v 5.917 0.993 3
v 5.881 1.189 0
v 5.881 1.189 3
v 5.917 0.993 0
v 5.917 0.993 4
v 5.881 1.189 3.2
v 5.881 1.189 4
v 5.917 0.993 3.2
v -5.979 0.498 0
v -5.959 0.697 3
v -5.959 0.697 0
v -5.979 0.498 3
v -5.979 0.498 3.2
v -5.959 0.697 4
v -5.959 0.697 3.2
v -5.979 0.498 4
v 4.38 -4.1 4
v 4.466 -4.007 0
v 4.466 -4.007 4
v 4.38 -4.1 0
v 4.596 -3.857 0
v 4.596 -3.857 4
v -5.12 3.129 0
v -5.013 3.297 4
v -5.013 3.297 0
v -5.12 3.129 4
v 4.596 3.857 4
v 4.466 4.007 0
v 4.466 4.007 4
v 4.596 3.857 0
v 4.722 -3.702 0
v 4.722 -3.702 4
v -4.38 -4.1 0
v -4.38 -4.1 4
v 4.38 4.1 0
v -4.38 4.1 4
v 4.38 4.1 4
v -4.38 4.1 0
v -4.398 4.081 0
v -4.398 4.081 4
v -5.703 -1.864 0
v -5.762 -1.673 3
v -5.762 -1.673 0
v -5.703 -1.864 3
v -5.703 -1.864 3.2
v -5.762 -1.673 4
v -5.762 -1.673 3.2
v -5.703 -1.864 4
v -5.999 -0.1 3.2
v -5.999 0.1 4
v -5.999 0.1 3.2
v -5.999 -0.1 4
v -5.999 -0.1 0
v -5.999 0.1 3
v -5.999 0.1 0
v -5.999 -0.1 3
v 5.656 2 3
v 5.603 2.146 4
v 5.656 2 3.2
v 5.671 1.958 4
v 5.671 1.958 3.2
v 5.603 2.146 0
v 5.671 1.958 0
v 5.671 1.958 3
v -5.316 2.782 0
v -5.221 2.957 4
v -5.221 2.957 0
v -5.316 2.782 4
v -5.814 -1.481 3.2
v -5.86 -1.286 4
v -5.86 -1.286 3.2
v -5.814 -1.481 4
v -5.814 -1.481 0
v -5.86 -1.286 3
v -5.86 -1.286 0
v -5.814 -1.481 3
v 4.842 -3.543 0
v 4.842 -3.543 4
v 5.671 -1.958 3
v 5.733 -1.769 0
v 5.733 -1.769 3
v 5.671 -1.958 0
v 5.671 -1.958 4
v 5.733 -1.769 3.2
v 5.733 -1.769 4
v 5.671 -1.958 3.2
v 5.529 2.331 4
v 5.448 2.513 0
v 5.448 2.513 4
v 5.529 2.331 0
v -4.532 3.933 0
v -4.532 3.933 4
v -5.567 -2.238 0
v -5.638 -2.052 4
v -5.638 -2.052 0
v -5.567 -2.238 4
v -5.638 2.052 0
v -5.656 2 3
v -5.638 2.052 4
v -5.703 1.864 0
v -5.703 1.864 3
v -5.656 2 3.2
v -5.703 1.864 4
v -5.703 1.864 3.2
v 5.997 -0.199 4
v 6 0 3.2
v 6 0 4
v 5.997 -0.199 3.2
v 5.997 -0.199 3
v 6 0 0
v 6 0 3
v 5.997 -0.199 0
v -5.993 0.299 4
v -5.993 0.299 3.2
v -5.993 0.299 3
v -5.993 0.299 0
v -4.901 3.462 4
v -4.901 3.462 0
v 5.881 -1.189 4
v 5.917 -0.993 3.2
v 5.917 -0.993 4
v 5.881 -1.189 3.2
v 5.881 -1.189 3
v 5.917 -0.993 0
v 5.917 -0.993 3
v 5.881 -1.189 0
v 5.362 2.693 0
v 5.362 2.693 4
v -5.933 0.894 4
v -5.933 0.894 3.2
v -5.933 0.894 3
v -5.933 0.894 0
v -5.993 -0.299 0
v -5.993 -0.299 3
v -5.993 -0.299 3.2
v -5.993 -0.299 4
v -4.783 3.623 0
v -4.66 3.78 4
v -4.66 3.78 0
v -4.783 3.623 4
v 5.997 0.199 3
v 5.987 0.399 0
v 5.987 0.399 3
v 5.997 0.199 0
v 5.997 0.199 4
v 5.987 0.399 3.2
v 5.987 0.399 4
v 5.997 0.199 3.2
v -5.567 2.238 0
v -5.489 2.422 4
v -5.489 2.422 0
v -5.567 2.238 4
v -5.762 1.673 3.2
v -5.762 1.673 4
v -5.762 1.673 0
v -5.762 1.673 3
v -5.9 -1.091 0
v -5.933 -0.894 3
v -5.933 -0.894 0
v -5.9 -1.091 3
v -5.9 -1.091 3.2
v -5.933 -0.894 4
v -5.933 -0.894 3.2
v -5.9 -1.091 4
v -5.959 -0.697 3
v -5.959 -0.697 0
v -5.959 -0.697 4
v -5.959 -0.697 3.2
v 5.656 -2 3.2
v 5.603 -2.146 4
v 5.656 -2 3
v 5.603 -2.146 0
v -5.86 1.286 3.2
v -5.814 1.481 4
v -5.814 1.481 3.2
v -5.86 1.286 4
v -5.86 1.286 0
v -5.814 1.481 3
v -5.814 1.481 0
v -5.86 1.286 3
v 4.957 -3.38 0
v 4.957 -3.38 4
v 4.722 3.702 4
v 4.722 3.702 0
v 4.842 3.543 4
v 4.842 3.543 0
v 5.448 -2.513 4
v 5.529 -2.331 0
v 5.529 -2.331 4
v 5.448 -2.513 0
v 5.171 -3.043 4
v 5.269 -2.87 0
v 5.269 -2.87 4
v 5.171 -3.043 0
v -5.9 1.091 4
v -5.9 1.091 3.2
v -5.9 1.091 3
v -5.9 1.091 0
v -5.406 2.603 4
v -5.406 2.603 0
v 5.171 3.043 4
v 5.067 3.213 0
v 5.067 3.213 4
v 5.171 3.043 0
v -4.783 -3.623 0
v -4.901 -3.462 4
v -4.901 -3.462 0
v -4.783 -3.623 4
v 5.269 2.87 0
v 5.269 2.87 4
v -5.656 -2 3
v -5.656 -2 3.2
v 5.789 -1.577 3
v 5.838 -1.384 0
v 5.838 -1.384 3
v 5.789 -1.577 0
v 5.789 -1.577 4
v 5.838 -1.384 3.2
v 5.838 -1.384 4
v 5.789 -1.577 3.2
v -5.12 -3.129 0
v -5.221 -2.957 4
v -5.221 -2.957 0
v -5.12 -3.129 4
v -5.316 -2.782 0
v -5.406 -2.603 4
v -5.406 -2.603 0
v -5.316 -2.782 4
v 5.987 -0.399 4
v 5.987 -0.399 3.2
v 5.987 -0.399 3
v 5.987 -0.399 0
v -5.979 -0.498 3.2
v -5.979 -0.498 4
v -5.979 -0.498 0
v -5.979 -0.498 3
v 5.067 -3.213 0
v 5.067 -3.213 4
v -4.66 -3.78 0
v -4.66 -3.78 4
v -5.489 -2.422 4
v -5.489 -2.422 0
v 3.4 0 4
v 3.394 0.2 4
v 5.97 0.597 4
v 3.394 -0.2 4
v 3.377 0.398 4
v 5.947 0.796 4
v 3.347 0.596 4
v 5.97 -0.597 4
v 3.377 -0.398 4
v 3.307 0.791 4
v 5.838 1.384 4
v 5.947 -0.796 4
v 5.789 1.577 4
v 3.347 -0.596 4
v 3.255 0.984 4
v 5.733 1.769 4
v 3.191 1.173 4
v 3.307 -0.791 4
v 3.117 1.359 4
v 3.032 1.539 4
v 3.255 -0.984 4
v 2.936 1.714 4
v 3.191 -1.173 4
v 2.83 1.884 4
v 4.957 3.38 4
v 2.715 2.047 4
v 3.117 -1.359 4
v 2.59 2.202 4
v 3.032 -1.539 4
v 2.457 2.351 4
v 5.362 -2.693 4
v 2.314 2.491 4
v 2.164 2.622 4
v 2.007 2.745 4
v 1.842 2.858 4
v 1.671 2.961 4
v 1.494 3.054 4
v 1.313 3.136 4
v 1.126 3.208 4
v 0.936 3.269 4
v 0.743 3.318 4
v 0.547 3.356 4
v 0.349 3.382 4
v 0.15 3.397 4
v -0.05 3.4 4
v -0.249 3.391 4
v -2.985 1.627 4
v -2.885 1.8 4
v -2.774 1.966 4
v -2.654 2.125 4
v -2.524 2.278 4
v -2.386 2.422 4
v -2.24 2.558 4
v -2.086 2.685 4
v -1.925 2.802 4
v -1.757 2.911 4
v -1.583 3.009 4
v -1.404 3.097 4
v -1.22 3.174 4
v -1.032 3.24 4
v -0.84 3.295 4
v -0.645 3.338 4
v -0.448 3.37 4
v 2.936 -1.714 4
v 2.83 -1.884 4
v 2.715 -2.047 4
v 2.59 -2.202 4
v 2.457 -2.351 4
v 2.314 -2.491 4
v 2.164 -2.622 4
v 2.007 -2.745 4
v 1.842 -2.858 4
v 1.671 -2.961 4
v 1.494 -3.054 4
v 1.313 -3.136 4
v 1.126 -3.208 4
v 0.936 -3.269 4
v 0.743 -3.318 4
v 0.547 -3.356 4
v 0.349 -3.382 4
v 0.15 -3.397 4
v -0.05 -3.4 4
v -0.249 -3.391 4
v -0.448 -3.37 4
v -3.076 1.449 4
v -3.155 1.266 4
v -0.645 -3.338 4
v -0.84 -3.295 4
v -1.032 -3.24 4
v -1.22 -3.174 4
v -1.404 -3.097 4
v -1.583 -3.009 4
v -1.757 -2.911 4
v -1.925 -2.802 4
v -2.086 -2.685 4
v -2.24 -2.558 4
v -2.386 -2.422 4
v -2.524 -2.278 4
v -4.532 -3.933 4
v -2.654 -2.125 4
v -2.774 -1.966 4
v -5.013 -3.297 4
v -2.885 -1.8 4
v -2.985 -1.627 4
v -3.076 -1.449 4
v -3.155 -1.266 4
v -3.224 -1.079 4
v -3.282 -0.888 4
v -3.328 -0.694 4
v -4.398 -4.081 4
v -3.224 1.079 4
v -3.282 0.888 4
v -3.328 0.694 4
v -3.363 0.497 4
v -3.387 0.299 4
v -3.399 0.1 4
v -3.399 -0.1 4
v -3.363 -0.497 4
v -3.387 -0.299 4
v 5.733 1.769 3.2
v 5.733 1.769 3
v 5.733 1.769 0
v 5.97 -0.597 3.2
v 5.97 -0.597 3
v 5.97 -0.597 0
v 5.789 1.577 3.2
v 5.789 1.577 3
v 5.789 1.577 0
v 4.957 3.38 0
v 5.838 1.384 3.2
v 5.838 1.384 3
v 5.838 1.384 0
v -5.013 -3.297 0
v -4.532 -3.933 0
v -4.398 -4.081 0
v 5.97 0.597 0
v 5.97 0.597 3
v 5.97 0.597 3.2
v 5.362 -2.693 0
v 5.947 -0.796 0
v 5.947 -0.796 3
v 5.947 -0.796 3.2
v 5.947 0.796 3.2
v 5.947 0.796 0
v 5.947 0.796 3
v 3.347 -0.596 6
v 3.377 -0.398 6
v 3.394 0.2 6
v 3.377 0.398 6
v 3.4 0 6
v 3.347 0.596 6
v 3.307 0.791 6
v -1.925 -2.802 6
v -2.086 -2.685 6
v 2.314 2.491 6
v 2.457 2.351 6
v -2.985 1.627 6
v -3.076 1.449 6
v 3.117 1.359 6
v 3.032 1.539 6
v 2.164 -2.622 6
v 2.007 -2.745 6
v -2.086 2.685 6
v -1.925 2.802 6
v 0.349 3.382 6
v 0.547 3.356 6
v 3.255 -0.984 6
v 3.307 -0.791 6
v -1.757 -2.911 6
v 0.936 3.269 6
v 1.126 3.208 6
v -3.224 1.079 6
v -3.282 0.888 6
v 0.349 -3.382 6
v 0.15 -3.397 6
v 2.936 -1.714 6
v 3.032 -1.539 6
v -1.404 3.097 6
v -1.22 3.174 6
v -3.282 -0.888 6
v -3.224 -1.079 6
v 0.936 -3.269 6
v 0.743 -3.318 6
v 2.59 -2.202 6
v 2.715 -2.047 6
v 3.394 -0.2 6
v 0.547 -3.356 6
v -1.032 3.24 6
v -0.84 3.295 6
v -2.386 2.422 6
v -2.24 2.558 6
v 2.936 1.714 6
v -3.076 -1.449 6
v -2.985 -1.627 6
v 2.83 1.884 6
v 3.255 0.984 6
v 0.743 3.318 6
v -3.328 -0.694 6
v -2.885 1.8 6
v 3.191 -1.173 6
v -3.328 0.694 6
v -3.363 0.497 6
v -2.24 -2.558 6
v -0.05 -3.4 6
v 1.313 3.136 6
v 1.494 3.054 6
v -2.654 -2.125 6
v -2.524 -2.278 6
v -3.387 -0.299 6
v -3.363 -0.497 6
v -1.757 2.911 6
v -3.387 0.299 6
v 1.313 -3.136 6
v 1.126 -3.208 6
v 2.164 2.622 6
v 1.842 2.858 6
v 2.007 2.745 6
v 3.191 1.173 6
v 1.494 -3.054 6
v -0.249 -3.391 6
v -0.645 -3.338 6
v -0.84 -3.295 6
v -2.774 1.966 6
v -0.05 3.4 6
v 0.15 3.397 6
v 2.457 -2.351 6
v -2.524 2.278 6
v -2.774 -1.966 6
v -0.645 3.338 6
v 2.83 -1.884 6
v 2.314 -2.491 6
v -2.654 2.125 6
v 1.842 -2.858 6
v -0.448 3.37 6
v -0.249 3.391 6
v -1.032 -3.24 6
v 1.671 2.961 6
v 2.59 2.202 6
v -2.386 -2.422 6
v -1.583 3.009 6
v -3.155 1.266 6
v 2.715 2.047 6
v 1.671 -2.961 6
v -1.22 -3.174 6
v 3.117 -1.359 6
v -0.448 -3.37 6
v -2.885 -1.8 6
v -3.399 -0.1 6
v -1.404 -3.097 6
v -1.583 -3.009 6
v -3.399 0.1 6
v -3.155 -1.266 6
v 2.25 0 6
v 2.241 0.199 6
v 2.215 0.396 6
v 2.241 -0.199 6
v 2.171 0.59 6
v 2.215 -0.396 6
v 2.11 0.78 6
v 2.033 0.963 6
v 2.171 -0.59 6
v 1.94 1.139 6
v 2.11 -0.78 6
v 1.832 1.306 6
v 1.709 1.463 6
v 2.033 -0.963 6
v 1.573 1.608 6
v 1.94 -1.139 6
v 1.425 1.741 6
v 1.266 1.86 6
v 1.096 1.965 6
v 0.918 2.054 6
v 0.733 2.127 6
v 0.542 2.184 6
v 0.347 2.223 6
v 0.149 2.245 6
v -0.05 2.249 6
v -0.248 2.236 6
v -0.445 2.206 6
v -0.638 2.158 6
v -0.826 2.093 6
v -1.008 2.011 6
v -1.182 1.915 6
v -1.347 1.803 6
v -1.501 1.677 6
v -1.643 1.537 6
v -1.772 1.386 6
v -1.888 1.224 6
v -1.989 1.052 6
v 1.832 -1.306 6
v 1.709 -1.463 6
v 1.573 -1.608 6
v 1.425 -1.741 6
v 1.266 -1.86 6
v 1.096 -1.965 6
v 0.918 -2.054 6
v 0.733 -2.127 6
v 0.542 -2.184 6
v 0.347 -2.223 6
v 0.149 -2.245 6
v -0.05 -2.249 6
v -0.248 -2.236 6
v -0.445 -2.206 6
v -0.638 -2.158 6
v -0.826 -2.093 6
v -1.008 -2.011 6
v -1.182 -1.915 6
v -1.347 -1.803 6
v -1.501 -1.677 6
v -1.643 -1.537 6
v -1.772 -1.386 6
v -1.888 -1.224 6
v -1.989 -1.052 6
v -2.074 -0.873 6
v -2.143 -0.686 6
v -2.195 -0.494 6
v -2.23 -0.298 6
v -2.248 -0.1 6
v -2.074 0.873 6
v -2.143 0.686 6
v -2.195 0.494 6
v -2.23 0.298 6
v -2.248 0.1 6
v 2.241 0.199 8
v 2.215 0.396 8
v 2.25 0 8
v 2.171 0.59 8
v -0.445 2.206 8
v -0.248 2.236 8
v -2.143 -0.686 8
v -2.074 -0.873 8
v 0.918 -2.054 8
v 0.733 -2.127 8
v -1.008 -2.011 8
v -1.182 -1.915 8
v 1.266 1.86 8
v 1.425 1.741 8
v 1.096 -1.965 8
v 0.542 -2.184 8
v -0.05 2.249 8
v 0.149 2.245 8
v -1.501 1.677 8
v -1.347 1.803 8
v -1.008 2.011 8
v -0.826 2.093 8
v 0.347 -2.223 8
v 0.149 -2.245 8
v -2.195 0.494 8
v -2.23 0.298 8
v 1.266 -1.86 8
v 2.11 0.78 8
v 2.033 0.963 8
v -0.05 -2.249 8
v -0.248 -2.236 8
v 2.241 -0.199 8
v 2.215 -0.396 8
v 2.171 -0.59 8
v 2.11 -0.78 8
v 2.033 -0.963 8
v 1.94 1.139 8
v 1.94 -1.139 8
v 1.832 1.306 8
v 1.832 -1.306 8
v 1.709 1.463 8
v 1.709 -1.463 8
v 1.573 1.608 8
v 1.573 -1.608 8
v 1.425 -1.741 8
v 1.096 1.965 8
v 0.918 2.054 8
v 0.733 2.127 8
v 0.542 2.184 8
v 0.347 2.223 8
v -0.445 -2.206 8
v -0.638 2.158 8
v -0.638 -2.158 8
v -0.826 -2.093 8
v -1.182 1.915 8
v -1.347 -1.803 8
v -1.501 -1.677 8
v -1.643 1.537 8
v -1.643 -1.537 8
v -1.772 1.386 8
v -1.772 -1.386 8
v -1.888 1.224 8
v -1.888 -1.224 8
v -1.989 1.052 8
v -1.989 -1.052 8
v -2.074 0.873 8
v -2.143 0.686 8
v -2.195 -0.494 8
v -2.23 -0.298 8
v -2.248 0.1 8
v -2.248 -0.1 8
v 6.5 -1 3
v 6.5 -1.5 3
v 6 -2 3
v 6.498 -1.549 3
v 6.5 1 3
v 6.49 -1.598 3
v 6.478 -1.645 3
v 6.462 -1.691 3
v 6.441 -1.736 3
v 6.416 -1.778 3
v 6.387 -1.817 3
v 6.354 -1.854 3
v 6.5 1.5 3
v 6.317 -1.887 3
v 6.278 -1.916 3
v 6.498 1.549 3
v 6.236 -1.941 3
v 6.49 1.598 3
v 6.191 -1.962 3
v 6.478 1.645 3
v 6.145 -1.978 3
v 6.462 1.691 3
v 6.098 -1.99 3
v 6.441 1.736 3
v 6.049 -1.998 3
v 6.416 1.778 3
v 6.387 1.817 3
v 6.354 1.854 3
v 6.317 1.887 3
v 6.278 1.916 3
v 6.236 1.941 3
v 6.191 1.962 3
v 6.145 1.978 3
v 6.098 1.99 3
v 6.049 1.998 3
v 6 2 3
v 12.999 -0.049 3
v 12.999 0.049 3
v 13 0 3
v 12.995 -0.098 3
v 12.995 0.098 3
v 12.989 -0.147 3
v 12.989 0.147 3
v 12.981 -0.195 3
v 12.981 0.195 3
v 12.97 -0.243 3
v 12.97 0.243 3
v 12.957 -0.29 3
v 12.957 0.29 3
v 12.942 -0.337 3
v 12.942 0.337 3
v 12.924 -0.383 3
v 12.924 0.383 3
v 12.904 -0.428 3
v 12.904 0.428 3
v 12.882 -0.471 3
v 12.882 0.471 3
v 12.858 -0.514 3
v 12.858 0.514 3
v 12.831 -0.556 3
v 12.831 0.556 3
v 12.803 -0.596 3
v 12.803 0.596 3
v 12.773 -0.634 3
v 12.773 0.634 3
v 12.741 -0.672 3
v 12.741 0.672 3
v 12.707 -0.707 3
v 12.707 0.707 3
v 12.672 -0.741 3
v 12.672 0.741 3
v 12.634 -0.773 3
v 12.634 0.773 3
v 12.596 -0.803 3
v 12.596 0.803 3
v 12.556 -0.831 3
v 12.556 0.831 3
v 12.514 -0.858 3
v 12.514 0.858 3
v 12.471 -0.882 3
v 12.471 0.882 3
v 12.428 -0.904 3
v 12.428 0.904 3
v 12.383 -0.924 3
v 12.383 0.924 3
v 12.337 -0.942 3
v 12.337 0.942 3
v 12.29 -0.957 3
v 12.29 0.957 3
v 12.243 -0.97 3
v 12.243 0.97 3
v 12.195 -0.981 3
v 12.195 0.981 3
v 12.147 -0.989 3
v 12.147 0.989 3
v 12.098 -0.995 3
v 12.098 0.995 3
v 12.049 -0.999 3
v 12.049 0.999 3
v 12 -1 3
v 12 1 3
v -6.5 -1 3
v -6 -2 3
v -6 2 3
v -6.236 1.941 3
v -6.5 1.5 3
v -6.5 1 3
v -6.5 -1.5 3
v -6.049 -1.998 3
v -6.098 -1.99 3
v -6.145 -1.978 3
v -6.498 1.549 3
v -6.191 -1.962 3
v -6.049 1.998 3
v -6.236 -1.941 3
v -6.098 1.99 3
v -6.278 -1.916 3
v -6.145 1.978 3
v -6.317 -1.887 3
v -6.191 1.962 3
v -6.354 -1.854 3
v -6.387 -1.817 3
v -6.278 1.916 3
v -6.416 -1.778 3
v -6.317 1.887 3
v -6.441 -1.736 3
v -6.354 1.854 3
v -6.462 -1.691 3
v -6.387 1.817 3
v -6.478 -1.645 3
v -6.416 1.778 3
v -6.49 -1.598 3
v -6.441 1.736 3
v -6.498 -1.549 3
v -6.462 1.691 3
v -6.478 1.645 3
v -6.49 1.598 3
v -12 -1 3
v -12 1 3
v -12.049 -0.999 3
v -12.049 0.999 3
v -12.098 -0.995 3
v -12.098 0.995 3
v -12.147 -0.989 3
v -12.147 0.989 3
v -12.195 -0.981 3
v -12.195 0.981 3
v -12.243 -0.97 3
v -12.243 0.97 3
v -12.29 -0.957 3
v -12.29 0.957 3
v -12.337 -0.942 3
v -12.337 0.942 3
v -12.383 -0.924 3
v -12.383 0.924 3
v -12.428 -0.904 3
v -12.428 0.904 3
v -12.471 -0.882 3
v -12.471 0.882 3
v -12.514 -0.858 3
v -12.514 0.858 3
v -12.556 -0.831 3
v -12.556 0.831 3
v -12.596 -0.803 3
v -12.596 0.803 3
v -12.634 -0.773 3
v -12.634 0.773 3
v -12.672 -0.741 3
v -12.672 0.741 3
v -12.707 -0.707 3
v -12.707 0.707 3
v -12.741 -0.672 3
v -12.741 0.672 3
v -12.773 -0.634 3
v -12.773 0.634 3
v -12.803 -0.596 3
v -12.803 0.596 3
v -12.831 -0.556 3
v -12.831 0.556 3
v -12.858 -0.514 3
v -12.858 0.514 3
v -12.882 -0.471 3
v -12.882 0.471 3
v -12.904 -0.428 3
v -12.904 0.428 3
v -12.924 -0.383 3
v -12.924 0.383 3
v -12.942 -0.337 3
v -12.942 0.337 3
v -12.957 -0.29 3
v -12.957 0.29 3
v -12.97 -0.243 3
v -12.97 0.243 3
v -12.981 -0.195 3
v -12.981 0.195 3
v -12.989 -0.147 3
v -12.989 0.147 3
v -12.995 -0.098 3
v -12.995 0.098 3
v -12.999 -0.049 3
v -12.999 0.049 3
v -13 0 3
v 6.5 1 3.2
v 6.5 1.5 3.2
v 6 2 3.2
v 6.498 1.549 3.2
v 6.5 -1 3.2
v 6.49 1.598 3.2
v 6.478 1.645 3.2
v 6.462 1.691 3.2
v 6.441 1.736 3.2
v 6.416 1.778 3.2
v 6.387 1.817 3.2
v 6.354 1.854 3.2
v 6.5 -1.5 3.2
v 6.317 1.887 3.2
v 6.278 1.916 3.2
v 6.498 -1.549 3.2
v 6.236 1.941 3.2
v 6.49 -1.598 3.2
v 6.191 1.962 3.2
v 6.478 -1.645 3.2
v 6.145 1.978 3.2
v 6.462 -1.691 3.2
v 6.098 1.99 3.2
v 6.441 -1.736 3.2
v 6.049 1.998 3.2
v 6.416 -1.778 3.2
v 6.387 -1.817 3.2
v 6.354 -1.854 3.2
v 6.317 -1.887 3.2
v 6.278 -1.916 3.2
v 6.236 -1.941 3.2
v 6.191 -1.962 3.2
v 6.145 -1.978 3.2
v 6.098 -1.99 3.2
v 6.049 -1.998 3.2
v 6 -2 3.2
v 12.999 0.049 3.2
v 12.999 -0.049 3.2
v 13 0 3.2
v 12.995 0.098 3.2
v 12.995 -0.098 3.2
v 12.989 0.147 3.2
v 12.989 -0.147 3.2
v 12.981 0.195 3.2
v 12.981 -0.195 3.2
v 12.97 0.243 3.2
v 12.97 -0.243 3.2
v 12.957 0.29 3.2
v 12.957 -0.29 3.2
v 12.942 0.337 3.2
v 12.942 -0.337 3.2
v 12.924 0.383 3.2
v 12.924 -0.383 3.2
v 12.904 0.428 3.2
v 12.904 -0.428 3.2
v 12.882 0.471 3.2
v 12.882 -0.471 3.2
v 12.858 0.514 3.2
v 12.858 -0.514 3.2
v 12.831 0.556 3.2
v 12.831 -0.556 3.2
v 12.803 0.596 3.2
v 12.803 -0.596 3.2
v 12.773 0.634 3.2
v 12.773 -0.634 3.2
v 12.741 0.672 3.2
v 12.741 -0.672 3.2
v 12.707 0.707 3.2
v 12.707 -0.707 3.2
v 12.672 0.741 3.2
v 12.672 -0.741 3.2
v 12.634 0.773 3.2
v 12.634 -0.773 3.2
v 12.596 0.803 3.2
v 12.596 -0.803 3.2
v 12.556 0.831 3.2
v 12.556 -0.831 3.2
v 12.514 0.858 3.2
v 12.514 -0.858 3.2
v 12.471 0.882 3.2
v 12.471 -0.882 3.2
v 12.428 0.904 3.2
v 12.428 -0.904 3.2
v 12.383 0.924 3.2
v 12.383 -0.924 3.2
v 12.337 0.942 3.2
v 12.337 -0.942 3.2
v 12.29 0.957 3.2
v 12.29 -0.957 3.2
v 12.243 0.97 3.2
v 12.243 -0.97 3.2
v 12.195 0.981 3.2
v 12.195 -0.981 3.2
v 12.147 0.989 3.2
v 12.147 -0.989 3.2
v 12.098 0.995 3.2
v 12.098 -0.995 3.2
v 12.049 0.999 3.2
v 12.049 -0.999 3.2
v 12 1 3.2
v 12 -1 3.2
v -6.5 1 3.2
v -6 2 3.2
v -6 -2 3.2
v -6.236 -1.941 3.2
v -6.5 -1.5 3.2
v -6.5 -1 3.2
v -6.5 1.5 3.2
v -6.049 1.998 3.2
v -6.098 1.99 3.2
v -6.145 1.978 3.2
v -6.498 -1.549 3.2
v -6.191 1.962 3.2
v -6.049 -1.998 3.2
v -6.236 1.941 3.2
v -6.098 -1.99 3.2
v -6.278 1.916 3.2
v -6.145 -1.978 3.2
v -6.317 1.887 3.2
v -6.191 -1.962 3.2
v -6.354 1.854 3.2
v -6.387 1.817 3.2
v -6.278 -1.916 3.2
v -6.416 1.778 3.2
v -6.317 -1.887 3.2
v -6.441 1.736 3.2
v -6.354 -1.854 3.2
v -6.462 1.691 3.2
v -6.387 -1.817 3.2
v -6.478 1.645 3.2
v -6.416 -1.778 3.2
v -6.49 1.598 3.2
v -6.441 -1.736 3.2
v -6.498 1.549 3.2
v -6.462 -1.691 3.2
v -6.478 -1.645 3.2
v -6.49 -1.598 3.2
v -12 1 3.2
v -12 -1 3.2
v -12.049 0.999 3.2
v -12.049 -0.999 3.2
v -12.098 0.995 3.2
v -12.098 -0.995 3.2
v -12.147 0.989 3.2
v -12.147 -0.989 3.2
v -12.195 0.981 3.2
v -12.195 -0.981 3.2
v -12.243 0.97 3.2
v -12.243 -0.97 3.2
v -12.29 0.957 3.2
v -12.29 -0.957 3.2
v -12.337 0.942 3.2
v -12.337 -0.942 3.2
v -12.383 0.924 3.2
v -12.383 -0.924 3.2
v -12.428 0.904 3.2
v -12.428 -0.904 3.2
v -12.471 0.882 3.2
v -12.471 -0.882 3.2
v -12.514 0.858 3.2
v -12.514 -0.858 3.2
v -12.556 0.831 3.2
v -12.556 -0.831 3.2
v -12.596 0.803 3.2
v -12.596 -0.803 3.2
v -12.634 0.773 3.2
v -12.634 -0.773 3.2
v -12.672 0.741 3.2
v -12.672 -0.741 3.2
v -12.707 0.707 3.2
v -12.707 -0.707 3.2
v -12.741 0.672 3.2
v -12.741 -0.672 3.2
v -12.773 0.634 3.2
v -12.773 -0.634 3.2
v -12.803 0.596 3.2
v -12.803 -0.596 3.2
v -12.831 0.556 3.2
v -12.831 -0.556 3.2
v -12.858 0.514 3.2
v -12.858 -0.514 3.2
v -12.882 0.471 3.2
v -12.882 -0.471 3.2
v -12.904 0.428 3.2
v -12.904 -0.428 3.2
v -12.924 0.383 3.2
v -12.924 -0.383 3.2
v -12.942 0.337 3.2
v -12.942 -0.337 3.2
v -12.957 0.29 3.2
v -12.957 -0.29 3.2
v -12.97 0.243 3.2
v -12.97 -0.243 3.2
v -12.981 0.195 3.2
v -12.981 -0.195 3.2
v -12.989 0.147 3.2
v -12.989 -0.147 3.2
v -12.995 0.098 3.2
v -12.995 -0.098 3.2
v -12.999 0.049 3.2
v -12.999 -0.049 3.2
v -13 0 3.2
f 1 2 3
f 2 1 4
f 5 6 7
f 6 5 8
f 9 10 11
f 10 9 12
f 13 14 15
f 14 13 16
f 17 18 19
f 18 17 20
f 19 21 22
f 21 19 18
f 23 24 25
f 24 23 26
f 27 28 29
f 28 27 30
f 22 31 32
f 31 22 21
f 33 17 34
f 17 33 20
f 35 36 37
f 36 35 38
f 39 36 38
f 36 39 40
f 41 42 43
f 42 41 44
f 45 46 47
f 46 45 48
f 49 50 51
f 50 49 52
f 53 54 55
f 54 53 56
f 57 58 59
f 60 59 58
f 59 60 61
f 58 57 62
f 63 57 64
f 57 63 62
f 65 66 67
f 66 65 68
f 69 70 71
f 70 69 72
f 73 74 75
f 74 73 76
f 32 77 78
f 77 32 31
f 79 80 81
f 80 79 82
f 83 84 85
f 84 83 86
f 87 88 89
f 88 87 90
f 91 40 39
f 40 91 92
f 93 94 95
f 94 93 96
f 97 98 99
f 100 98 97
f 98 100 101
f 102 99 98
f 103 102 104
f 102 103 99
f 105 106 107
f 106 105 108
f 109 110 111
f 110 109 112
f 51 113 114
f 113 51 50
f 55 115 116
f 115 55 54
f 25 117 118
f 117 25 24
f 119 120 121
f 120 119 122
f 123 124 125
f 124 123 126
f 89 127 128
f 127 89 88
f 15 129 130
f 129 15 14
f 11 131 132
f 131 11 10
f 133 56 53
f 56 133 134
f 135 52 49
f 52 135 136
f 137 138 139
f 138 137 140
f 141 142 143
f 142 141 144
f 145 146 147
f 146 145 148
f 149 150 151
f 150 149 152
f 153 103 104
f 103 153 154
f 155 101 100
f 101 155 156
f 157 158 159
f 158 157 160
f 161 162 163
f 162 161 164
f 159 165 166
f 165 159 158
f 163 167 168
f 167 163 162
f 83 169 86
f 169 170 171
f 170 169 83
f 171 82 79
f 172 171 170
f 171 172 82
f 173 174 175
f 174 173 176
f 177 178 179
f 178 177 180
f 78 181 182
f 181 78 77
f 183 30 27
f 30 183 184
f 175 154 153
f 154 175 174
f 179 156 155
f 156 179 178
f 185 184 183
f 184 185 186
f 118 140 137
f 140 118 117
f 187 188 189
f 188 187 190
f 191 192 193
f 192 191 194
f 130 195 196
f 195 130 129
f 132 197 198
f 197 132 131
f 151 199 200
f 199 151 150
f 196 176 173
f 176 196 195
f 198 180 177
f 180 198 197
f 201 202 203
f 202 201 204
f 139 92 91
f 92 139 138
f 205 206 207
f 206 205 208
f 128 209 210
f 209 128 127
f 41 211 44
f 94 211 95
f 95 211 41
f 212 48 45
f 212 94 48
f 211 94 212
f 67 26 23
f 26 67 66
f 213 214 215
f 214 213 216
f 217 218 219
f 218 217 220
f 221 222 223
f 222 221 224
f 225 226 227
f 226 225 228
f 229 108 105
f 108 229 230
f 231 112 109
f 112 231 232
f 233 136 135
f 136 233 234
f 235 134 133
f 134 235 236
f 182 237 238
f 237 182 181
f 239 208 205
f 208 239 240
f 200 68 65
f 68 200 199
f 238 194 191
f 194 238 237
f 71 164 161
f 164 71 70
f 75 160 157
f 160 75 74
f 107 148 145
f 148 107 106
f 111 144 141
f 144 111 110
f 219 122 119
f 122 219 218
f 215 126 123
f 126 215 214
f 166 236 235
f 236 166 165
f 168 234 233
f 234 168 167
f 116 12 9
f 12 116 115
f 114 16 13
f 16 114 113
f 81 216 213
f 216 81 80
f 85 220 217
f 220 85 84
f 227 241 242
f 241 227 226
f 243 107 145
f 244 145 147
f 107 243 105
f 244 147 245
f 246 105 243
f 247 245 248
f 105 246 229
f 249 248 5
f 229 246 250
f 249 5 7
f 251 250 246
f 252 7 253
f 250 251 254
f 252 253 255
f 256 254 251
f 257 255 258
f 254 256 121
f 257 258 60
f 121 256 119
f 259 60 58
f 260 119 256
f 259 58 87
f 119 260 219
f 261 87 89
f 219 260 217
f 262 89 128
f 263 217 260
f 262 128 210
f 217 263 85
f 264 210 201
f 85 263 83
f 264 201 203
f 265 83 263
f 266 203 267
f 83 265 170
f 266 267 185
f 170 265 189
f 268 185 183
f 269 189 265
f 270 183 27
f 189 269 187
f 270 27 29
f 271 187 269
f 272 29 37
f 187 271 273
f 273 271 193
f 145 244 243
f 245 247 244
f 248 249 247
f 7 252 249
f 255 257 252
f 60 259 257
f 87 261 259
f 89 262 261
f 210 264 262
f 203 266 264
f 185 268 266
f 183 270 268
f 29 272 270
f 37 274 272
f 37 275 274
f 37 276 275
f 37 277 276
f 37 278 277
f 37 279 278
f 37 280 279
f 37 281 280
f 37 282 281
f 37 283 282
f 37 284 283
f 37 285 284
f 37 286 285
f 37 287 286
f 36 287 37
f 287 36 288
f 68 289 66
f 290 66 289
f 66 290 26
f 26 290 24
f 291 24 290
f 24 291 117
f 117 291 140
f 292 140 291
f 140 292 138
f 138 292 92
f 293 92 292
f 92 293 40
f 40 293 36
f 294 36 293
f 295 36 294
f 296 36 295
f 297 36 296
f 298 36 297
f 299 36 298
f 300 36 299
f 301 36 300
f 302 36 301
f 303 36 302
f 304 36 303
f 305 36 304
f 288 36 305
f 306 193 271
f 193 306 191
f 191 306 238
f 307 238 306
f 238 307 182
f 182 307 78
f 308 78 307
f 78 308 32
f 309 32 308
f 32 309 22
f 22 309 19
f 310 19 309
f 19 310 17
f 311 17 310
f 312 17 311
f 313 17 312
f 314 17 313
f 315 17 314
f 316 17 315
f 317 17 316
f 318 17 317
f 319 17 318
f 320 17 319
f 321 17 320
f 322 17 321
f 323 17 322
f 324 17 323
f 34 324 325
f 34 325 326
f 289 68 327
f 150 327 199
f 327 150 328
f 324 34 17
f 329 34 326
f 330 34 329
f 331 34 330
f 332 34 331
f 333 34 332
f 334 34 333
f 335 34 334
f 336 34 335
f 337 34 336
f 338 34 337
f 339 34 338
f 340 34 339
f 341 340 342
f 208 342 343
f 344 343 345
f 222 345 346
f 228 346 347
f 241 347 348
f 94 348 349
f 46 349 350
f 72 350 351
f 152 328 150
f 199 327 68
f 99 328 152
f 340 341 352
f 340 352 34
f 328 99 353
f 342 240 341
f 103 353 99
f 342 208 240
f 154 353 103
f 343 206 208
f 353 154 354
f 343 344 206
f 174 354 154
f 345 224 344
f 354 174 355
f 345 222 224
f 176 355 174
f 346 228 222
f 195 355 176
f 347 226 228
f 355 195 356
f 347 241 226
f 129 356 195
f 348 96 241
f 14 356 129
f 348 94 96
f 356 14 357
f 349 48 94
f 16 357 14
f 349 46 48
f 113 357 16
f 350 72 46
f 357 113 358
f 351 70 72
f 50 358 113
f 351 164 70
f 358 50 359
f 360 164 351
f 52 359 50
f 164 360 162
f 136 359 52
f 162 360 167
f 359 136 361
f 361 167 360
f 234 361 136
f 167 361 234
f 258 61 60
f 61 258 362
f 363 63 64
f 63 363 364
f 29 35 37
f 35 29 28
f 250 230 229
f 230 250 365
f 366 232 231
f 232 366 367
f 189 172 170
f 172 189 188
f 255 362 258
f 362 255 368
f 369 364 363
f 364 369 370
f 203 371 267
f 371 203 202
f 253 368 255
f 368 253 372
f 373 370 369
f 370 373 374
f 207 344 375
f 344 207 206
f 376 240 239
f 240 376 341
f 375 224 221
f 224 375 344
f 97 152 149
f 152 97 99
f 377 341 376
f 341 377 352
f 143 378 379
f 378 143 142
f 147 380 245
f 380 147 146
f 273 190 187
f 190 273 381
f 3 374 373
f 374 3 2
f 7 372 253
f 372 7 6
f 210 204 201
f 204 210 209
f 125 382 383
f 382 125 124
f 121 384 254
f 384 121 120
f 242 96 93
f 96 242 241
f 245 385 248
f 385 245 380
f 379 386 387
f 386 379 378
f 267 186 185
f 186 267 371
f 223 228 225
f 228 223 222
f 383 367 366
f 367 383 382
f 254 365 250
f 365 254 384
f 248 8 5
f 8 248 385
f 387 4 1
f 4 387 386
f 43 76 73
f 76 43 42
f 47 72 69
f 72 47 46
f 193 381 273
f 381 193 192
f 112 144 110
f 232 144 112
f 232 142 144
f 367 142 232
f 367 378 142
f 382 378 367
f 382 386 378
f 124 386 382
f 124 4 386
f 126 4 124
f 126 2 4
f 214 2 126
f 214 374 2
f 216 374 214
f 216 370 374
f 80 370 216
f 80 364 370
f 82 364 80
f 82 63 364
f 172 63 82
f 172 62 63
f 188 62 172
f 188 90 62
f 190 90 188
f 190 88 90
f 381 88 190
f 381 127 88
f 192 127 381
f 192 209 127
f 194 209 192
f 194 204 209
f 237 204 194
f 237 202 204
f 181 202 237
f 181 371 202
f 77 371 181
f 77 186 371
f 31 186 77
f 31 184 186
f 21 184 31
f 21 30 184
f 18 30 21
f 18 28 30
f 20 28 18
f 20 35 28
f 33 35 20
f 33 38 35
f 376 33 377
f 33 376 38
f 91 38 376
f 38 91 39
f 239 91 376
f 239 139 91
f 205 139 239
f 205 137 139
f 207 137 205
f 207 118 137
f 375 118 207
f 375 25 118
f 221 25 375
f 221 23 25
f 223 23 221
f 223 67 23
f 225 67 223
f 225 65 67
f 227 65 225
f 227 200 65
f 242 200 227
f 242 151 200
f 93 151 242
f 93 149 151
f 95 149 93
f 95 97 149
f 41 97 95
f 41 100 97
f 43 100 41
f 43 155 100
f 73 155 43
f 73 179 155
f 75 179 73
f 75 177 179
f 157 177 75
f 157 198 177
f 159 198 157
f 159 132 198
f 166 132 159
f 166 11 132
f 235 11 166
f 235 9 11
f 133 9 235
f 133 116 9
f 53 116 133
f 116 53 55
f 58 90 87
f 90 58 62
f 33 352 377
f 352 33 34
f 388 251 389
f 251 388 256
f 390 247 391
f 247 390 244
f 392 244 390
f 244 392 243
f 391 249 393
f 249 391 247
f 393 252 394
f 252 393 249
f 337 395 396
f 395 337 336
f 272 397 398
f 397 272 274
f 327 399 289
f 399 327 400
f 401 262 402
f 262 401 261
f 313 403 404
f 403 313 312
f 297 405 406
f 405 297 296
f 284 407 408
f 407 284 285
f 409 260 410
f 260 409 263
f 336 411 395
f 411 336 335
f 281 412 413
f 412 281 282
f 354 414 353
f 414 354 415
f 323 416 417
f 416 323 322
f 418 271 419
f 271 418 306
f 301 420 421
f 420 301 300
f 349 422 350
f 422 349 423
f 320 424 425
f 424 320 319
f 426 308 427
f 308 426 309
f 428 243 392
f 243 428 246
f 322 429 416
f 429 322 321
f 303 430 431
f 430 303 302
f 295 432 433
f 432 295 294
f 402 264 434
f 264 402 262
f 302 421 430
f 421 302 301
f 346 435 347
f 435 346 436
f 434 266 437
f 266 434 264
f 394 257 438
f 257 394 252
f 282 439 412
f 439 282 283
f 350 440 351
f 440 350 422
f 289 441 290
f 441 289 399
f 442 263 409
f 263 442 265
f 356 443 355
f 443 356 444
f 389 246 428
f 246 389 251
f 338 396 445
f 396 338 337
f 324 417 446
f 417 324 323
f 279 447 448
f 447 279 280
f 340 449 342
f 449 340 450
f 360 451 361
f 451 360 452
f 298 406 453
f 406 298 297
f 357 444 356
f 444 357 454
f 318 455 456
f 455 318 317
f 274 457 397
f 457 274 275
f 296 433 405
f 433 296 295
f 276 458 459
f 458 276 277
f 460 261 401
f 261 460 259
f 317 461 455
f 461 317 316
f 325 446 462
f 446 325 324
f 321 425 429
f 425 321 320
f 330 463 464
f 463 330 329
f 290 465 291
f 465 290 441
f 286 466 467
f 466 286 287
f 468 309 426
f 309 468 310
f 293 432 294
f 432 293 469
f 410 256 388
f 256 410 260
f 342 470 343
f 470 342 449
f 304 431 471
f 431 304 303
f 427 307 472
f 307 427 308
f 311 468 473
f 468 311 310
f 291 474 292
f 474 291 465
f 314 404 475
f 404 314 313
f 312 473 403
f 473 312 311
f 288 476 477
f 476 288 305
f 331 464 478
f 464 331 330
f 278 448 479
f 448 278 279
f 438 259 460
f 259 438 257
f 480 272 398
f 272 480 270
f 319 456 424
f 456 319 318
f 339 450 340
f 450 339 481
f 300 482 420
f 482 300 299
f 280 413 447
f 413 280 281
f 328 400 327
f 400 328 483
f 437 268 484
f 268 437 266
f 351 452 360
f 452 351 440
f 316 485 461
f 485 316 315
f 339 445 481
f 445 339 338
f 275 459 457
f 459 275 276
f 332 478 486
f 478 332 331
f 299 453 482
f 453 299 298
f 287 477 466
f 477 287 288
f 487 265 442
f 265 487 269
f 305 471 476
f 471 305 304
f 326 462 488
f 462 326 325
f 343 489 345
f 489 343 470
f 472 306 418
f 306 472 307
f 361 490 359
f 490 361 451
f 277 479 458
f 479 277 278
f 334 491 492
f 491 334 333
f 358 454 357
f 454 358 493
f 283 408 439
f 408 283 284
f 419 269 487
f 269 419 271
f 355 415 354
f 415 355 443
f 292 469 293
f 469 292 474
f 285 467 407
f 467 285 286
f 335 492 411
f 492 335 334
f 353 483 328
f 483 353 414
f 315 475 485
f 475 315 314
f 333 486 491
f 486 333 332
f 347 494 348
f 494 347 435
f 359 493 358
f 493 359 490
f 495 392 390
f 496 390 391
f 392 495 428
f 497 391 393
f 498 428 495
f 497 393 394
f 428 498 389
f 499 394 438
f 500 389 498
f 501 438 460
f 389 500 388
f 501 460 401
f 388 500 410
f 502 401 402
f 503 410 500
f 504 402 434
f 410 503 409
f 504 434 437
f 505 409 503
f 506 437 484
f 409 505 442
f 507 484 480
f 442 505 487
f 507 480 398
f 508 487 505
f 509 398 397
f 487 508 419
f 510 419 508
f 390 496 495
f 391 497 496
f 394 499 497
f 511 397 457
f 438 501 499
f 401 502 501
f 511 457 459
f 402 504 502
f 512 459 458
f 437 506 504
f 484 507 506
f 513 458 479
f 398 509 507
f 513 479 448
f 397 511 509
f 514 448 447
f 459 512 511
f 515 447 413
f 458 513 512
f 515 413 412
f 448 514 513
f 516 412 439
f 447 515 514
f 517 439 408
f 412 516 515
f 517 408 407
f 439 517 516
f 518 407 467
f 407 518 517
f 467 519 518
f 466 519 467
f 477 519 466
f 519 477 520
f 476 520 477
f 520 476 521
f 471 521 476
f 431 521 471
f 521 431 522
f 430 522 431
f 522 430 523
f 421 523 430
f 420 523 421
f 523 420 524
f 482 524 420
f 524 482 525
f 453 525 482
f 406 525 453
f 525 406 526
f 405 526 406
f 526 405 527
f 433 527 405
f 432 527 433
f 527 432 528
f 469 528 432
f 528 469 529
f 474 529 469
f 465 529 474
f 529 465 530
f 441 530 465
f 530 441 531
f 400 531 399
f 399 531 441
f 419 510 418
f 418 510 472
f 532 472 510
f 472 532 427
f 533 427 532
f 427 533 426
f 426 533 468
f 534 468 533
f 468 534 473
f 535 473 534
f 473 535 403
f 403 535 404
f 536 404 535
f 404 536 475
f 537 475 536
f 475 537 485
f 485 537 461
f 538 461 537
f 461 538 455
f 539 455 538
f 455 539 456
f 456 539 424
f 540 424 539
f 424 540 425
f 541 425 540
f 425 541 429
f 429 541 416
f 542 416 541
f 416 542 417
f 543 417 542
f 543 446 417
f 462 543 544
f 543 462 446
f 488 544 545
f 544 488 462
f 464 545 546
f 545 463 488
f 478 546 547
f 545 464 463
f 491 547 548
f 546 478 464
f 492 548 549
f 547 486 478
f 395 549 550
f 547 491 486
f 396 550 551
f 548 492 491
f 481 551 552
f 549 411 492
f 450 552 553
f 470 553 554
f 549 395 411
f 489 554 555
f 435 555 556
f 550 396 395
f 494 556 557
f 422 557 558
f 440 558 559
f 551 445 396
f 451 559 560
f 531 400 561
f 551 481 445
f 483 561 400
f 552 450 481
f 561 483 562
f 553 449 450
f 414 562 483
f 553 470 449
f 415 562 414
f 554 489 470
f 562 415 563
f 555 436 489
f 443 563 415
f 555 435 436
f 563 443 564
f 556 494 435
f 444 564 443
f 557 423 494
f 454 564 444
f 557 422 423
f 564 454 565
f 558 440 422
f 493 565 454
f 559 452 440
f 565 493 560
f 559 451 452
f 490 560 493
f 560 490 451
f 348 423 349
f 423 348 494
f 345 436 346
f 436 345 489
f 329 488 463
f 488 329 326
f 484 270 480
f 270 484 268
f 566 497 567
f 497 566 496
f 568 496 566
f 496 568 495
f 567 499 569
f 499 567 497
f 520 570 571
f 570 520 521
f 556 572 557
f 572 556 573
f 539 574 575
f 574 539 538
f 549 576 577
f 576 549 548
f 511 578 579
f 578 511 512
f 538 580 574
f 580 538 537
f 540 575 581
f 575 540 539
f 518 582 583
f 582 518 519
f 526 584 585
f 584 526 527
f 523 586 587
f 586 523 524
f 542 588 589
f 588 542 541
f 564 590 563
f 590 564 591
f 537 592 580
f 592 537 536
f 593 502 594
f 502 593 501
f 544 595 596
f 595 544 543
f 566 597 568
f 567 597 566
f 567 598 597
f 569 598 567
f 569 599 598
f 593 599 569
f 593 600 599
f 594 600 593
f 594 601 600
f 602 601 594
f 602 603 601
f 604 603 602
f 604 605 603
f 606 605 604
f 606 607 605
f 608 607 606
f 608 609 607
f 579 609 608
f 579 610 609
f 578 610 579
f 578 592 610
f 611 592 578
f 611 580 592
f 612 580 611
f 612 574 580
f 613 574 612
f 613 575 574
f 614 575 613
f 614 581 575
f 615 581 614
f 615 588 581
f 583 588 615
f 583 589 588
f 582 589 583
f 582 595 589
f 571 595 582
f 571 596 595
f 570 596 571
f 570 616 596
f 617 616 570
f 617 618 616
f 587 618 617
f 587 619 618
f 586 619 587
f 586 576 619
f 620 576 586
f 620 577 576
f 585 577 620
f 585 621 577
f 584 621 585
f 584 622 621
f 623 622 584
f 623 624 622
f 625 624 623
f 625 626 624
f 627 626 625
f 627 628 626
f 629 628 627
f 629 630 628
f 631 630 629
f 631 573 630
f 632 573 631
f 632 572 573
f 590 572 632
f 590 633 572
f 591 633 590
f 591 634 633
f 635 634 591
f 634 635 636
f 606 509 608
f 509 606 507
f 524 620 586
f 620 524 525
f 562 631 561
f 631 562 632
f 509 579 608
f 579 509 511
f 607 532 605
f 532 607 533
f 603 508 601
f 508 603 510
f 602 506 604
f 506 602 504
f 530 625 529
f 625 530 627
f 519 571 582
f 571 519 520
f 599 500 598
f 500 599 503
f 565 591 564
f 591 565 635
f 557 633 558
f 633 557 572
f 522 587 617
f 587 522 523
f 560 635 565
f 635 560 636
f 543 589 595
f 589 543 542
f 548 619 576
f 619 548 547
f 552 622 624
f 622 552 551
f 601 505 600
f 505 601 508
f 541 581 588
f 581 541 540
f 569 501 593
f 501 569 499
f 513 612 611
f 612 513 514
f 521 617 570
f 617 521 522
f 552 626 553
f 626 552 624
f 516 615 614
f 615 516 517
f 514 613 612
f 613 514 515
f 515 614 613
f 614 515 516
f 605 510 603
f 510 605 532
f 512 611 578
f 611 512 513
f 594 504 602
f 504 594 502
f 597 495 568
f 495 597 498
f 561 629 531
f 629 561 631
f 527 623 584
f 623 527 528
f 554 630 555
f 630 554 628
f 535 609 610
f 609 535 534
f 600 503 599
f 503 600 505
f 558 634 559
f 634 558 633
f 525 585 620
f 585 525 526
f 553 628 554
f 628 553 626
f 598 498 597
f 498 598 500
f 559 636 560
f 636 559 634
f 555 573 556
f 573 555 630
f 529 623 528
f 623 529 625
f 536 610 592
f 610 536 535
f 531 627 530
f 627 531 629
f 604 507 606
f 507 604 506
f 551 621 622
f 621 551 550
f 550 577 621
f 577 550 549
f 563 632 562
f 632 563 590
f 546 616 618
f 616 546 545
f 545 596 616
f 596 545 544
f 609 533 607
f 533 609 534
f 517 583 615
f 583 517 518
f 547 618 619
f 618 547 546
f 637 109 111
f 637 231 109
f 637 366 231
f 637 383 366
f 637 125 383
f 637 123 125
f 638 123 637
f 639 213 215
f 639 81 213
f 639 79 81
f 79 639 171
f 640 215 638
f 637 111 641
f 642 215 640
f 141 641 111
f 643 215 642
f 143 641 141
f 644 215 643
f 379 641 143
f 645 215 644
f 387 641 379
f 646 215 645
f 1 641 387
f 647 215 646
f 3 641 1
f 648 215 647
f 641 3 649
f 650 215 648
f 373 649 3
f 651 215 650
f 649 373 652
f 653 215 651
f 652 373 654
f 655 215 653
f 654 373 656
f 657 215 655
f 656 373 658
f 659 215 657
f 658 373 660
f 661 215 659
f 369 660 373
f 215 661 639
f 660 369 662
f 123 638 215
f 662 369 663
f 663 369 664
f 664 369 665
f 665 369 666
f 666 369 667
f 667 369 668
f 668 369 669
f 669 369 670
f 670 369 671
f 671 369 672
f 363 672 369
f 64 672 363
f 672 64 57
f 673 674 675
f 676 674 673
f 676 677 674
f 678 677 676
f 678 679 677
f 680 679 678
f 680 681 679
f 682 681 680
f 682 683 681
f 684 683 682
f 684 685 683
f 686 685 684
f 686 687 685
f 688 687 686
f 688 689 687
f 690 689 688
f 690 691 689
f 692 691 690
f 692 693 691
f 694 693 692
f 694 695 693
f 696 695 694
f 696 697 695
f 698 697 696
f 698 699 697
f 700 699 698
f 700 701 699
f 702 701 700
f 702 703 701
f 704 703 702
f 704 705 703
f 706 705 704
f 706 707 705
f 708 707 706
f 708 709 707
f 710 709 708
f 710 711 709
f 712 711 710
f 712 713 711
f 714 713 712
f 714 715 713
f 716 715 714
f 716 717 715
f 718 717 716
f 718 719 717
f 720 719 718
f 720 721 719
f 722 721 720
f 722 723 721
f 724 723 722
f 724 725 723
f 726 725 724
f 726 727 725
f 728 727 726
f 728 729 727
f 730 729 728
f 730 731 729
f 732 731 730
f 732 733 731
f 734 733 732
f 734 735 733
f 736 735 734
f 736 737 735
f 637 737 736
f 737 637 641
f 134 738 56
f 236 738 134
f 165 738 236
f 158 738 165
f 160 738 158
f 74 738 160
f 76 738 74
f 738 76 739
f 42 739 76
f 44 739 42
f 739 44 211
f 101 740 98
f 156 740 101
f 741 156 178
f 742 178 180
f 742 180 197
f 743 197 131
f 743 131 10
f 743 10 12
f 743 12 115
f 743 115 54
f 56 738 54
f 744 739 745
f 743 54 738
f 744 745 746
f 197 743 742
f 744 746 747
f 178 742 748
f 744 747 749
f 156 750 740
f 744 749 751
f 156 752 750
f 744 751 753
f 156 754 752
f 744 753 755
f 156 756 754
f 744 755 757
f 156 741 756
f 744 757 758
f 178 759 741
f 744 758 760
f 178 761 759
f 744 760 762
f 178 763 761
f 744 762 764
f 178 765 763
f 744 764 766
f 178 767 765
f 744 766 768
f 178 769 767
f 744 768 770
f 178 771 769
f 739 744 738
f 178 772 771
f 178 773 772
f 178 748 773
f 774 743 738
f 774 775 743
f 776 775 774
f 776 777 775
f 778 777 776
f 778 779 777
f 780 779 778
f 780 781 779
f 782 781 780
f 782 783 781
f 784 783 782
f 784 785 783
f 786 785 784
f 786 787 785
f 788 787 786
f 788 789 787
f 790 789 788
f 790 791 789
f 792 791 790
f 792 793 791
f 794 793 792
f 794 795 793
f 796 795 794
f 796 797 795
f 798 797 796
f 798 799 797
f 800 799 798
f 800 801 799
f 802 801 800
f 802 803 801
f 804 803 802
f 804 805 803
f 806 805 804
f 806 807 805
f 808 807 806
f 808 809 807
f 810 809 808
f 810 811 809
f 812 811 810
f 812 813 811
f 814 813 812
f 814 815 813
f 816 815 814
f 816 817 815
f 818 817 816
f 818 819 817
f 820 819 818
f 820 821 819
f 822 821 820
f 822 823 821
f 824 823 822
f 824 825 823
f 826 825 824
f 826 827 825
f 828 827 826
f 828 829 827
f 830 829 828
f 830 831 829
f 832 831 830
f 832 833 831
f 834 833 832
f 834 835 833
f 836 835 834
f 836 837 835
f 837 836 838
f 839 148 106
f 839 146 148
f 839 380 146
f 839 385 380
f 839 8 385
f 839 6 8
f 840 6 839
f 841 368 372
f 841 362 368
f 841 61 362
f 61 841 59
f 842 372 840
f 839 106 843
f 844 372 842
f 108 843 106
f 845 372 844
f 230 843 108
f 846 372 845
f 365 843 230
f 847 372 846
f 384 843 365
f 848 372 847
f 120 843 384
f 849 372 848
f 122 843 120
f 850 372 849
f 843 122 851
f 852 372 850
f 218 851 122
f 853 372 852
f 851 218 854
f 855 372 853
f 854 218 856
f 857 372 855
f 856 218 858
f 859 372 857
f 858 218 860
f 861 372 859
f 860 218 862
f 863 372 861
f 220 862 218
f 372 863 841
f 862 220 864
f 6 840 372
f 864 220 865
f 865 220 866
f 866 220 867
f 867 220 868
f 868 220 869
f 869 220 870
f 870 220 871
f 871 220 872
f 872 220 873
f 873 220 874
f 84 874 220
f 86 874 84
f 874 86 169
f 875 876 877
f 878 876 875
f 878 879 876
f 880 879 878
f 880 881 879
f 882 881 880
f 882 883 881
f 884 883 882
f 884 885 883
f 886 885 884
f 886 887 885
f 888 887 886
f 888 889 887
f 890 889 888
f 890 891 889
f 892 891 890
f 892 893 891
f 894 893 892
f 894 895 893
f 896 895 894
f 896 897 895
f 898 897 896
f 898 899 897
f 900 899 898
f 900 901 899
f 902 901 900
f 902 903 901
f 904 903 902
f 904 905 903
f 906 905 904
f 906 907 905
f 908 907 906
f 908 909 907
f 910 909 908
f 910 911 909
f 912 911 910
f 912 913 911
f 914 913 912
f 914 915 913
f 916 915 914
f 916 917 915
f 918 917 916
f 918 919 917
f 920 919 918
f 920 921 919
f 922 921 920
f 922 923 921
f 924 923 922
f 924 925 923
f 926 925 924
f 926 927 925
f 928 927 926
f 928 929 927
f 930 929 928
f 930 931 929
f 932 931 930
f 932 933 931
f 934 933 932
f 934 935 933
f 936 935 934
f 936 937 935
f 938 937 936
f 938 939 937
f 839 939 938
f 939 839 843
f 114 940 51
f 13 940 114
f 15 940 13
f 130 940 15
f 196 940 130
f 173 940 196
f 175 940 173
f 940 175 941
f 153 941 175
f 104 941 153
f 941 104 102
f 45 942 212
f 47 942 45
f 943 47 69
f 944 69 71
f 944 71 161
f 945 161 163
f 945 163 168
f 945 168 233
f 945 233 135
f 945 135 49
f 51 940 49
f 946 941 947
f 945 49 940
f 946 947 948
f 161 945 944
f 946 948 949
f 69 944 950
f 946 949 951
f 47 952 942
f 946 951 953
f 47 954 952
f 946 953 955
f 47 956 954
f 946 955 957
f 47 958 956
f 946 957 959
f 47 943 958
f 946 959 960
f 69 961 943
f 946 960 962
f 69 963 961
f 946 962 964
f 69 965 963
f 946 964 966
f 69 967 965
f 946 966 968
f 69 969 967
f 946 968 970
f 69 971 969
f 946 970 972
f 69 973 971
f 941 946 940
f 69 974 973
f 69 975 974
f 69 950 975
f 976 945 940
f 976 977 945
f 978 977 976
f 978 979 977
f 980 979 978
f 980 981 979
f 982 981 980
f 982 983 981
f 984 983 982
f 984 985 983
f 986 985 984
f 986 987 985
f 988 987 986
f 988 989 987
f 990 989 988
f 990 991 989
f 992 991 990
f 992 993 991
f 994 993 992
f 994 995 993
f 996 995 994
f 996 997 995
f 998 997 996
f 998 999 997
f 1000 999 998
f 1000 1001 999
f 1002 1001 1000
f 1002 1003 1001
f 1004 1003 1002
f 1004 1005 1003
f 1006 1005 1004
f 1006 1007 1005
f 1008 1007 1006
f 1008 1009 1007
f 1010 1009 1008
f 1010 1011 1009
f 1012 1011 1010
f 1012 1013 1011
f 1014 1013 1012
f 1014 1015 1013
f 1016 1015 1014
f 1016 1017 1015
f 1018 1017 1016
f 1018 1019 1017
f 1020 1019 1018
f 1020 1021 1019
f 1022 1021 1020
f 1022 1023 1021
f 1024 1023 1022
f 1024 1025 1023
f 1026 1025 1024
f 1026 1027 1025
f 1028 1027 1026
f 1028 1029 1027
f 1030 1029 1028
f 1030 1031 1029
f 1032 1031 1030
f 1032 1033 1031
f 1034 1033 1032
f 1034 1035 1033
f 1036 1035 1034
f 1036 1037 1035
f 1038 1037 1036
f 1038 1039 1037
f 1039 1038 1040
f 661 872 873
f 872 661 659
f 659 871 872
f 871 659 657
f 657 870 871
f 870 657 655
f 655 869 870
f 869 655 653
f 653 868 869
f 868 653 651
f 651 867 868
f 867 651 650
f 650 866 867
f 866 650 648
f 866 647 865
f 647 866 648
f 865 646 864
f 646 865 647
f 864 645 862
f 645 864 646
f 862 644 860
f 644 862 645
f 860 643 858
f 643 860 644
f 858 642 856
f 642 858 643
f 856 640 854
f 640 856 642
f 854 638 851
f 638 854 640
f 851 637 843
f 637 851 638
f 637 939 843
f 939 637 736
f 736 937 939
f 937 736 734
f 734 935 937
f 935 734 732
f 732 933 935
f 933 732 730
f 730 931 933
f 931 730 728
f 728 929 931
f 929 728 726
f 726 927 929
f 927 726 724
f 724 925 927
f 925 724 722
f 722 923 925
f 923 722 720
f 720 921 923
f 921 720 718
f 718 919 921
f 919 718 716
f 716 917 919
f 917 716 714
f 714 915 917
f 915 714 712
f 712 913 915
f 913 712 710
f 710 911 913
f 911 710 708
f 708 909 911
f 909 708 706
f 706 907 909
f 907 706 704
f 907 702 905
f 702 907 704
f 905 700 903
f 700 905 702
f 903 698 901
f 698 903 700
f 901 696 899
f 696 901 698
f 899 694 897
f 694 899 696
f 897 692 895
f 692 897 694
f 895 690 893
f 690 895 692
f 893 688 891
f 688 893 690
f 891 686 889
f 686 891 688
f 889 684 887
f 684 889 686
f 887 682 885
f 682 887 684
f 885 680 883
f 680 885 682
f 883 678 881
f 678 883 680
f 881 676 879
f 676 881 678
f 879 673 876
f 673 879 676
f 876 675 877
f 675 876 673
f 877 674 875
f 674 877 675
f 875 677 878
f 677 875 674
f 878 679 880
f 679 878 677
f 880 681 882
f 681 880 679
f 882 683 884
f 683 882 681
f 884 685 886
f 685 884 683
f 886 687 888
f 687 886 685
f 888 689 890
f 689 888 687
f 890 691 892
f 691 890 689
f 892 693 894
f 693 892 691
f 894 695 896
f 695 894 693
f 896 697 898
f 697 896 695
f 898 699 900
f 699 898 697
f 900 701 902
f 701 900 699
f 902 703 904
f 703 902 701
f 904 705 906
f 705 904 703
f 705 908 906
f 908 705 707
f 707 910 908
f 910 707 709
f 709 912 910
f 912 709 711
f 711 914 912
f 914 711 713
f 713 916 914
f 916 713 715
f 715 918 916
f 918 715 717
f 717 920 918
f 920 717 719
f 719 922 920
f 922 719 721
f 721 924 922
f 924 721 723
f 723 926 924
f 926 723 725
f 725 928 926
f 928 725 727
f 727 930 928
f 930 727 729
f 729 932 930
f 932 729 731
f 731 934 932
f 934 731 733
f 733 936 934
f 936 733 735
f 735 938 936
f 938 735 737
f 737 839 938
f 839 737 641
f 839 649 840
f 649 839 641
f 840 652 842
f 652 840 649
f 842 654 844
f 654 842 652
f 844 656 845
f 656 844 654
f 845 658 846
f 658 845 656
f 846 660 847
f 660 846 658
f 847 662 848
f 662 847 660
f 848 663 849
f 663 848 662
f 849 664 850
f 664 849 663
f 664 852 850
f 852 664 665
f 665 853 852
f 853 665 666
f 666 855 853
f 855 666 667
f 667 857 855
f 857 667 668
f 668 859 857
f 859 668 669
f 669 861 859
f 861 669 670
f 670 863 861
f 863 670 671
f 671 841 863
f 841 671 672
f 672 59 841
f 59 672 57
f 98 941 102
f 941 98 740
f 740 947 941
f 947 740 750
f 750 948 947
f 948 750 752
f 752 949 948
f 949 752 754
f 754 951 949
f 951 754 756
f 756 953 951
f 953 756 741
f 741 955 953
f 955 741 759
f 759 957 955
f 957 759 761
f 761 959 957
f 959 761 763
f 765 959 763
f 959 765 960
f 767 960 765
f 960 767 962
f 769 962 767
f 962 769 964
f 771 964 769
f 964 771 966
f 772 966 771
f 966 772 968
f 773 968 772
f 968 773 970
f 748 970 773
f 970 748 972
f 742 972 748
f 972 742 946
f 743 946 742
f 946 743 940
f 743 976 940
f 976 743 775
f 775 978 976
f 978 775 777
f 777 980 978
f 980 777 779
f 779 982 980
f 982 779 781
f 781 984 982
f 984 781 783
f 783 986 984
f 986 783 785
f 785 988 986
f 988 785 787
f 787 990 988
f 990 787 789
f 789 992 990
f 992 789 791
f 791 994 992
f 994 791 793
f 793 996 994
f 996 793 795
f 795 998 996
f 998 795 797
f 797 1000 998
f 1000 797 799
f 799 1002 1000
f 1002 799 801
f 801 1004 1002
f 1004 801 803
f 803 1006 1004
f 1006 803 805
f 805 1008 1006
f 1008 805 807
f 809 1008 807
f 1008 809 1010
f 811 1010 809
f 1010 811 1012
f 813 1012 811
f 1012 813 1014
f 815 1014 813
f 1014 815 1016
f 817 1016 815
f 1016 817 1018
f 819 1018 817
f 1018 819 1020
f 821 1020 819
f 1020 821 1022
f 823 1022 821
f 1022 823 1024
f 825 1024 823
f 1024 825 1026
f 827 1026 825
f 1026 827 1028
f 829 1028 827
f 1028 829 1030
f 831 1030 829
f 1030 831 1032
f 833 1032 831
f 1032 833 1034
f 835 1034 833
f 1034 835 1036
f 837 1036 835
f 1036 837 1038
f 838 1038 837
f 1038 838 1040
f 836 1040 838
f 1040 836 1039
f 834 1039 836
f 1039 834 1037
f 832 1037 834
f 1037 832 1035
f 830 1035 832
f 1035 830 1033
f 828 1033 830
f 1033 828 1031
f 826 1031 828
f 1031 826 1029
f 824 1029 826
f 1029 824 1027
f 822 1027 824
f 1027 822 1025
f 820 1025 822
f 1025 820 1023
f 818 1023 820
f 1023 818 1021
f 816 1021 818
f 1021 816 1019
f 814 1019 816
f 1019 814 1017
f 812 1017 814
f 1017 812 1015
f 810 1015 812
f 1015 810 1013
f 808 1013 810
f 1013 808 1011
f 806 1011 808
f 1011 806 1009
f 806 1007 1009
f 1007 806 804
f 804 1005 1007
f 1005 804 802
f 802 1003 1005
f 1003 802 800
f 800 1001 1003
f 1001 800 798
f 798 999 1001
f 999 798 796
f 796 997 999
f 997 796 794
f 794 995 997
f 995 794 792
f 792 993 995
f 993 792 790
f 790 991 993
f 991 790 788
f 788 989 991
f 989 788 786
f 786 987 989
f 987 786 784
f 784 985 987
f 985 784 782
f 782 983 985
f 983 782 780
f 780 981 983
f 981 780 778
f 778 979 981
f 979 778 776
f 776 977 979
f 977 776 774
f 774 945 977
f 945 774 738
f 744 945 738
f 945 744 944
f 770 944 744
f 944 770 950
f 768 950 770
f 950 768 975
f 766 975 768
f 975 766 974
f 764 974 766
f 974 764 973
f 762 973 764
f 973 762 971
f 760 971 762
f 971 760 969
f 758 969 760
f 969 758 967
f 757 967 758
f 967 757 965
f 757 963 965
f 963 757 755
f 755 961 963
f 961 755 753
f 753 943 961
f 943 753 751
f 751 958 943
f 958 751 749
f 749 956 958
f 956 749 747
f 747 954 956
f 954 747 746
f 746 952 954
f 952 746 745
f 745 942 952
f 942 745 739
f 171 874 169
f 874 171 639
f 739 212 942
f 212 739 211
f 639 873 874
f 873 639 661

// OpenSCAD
use <bendlib.scad>;

function button(
    body_dim = undef, 
    mount_dim = undef, 
    pin_dim = undef,
    contact_dim = undef, 
    contact_offset = undef,
    contact_thickness = undef
 ) = let(
    body_dim = bl_def(body_dim, [12, 8.2, 4]),
    mount_dim = bl_def(mount_dim, [6.8, 2]),
    pin_dim = bl_def(pin_dim, [4.5, 2]),
    contact_dim = bl_def(contact_dim, [[13, 4, 0.5], [26, 2, 1]]),
    contact_offset = bl_def(contact_offset, [0,0,3]),
    contact_thickness = bl_def(contact_thickness, 0.2)
    
) [
    body_dim, 
    mount_dim,
    pin_dim,
    contact_dim,
    contact_offset,
    contact_thickness
];

function button_body_dim(type) = type[0];
function button_mount_dim(type) = type[1];
function button_pin_dim(type) = type[2];
function button_contact_dim(type) = type[3];
function button_contact_offset(type) = type[4];
function button_contact_thickness(type) = type[5];


module button_body_shape(type) {
    body_dim = button_body_dim(type);
    intersection() {
        circle(d = body_dim[0]);
        square(bl_2d(body_dim), center=true);
    }
}

module button(type = button()) {
    
    body_dim = button_body_dim(type);
    mount_dim = button_mount_dim(type);
    pin_dim = button_pin_dim(type);
    
    color("black")
    linear_extrude(body_dim[2])
    button_body_shape(type);
    
    color("#111111")
    cylinder(d = mount_dim[0], h = mount_dim[1] + body_dim[2]);
    color("#222222")
    cylinder(d = pin_dim[0], h = pin_dim[1] + mount_dim[1] + body_dim[2]);
    
    
    translate(button_contact_offset(type))
    linear_extrude(button_contact_thickness(type))
    for (c = button_contact_dim(type)) {
        bl_square(c, radius = c[2], center=true);
    }
    
}

$fa = 0.2;
$fs = 0.2;

button();
